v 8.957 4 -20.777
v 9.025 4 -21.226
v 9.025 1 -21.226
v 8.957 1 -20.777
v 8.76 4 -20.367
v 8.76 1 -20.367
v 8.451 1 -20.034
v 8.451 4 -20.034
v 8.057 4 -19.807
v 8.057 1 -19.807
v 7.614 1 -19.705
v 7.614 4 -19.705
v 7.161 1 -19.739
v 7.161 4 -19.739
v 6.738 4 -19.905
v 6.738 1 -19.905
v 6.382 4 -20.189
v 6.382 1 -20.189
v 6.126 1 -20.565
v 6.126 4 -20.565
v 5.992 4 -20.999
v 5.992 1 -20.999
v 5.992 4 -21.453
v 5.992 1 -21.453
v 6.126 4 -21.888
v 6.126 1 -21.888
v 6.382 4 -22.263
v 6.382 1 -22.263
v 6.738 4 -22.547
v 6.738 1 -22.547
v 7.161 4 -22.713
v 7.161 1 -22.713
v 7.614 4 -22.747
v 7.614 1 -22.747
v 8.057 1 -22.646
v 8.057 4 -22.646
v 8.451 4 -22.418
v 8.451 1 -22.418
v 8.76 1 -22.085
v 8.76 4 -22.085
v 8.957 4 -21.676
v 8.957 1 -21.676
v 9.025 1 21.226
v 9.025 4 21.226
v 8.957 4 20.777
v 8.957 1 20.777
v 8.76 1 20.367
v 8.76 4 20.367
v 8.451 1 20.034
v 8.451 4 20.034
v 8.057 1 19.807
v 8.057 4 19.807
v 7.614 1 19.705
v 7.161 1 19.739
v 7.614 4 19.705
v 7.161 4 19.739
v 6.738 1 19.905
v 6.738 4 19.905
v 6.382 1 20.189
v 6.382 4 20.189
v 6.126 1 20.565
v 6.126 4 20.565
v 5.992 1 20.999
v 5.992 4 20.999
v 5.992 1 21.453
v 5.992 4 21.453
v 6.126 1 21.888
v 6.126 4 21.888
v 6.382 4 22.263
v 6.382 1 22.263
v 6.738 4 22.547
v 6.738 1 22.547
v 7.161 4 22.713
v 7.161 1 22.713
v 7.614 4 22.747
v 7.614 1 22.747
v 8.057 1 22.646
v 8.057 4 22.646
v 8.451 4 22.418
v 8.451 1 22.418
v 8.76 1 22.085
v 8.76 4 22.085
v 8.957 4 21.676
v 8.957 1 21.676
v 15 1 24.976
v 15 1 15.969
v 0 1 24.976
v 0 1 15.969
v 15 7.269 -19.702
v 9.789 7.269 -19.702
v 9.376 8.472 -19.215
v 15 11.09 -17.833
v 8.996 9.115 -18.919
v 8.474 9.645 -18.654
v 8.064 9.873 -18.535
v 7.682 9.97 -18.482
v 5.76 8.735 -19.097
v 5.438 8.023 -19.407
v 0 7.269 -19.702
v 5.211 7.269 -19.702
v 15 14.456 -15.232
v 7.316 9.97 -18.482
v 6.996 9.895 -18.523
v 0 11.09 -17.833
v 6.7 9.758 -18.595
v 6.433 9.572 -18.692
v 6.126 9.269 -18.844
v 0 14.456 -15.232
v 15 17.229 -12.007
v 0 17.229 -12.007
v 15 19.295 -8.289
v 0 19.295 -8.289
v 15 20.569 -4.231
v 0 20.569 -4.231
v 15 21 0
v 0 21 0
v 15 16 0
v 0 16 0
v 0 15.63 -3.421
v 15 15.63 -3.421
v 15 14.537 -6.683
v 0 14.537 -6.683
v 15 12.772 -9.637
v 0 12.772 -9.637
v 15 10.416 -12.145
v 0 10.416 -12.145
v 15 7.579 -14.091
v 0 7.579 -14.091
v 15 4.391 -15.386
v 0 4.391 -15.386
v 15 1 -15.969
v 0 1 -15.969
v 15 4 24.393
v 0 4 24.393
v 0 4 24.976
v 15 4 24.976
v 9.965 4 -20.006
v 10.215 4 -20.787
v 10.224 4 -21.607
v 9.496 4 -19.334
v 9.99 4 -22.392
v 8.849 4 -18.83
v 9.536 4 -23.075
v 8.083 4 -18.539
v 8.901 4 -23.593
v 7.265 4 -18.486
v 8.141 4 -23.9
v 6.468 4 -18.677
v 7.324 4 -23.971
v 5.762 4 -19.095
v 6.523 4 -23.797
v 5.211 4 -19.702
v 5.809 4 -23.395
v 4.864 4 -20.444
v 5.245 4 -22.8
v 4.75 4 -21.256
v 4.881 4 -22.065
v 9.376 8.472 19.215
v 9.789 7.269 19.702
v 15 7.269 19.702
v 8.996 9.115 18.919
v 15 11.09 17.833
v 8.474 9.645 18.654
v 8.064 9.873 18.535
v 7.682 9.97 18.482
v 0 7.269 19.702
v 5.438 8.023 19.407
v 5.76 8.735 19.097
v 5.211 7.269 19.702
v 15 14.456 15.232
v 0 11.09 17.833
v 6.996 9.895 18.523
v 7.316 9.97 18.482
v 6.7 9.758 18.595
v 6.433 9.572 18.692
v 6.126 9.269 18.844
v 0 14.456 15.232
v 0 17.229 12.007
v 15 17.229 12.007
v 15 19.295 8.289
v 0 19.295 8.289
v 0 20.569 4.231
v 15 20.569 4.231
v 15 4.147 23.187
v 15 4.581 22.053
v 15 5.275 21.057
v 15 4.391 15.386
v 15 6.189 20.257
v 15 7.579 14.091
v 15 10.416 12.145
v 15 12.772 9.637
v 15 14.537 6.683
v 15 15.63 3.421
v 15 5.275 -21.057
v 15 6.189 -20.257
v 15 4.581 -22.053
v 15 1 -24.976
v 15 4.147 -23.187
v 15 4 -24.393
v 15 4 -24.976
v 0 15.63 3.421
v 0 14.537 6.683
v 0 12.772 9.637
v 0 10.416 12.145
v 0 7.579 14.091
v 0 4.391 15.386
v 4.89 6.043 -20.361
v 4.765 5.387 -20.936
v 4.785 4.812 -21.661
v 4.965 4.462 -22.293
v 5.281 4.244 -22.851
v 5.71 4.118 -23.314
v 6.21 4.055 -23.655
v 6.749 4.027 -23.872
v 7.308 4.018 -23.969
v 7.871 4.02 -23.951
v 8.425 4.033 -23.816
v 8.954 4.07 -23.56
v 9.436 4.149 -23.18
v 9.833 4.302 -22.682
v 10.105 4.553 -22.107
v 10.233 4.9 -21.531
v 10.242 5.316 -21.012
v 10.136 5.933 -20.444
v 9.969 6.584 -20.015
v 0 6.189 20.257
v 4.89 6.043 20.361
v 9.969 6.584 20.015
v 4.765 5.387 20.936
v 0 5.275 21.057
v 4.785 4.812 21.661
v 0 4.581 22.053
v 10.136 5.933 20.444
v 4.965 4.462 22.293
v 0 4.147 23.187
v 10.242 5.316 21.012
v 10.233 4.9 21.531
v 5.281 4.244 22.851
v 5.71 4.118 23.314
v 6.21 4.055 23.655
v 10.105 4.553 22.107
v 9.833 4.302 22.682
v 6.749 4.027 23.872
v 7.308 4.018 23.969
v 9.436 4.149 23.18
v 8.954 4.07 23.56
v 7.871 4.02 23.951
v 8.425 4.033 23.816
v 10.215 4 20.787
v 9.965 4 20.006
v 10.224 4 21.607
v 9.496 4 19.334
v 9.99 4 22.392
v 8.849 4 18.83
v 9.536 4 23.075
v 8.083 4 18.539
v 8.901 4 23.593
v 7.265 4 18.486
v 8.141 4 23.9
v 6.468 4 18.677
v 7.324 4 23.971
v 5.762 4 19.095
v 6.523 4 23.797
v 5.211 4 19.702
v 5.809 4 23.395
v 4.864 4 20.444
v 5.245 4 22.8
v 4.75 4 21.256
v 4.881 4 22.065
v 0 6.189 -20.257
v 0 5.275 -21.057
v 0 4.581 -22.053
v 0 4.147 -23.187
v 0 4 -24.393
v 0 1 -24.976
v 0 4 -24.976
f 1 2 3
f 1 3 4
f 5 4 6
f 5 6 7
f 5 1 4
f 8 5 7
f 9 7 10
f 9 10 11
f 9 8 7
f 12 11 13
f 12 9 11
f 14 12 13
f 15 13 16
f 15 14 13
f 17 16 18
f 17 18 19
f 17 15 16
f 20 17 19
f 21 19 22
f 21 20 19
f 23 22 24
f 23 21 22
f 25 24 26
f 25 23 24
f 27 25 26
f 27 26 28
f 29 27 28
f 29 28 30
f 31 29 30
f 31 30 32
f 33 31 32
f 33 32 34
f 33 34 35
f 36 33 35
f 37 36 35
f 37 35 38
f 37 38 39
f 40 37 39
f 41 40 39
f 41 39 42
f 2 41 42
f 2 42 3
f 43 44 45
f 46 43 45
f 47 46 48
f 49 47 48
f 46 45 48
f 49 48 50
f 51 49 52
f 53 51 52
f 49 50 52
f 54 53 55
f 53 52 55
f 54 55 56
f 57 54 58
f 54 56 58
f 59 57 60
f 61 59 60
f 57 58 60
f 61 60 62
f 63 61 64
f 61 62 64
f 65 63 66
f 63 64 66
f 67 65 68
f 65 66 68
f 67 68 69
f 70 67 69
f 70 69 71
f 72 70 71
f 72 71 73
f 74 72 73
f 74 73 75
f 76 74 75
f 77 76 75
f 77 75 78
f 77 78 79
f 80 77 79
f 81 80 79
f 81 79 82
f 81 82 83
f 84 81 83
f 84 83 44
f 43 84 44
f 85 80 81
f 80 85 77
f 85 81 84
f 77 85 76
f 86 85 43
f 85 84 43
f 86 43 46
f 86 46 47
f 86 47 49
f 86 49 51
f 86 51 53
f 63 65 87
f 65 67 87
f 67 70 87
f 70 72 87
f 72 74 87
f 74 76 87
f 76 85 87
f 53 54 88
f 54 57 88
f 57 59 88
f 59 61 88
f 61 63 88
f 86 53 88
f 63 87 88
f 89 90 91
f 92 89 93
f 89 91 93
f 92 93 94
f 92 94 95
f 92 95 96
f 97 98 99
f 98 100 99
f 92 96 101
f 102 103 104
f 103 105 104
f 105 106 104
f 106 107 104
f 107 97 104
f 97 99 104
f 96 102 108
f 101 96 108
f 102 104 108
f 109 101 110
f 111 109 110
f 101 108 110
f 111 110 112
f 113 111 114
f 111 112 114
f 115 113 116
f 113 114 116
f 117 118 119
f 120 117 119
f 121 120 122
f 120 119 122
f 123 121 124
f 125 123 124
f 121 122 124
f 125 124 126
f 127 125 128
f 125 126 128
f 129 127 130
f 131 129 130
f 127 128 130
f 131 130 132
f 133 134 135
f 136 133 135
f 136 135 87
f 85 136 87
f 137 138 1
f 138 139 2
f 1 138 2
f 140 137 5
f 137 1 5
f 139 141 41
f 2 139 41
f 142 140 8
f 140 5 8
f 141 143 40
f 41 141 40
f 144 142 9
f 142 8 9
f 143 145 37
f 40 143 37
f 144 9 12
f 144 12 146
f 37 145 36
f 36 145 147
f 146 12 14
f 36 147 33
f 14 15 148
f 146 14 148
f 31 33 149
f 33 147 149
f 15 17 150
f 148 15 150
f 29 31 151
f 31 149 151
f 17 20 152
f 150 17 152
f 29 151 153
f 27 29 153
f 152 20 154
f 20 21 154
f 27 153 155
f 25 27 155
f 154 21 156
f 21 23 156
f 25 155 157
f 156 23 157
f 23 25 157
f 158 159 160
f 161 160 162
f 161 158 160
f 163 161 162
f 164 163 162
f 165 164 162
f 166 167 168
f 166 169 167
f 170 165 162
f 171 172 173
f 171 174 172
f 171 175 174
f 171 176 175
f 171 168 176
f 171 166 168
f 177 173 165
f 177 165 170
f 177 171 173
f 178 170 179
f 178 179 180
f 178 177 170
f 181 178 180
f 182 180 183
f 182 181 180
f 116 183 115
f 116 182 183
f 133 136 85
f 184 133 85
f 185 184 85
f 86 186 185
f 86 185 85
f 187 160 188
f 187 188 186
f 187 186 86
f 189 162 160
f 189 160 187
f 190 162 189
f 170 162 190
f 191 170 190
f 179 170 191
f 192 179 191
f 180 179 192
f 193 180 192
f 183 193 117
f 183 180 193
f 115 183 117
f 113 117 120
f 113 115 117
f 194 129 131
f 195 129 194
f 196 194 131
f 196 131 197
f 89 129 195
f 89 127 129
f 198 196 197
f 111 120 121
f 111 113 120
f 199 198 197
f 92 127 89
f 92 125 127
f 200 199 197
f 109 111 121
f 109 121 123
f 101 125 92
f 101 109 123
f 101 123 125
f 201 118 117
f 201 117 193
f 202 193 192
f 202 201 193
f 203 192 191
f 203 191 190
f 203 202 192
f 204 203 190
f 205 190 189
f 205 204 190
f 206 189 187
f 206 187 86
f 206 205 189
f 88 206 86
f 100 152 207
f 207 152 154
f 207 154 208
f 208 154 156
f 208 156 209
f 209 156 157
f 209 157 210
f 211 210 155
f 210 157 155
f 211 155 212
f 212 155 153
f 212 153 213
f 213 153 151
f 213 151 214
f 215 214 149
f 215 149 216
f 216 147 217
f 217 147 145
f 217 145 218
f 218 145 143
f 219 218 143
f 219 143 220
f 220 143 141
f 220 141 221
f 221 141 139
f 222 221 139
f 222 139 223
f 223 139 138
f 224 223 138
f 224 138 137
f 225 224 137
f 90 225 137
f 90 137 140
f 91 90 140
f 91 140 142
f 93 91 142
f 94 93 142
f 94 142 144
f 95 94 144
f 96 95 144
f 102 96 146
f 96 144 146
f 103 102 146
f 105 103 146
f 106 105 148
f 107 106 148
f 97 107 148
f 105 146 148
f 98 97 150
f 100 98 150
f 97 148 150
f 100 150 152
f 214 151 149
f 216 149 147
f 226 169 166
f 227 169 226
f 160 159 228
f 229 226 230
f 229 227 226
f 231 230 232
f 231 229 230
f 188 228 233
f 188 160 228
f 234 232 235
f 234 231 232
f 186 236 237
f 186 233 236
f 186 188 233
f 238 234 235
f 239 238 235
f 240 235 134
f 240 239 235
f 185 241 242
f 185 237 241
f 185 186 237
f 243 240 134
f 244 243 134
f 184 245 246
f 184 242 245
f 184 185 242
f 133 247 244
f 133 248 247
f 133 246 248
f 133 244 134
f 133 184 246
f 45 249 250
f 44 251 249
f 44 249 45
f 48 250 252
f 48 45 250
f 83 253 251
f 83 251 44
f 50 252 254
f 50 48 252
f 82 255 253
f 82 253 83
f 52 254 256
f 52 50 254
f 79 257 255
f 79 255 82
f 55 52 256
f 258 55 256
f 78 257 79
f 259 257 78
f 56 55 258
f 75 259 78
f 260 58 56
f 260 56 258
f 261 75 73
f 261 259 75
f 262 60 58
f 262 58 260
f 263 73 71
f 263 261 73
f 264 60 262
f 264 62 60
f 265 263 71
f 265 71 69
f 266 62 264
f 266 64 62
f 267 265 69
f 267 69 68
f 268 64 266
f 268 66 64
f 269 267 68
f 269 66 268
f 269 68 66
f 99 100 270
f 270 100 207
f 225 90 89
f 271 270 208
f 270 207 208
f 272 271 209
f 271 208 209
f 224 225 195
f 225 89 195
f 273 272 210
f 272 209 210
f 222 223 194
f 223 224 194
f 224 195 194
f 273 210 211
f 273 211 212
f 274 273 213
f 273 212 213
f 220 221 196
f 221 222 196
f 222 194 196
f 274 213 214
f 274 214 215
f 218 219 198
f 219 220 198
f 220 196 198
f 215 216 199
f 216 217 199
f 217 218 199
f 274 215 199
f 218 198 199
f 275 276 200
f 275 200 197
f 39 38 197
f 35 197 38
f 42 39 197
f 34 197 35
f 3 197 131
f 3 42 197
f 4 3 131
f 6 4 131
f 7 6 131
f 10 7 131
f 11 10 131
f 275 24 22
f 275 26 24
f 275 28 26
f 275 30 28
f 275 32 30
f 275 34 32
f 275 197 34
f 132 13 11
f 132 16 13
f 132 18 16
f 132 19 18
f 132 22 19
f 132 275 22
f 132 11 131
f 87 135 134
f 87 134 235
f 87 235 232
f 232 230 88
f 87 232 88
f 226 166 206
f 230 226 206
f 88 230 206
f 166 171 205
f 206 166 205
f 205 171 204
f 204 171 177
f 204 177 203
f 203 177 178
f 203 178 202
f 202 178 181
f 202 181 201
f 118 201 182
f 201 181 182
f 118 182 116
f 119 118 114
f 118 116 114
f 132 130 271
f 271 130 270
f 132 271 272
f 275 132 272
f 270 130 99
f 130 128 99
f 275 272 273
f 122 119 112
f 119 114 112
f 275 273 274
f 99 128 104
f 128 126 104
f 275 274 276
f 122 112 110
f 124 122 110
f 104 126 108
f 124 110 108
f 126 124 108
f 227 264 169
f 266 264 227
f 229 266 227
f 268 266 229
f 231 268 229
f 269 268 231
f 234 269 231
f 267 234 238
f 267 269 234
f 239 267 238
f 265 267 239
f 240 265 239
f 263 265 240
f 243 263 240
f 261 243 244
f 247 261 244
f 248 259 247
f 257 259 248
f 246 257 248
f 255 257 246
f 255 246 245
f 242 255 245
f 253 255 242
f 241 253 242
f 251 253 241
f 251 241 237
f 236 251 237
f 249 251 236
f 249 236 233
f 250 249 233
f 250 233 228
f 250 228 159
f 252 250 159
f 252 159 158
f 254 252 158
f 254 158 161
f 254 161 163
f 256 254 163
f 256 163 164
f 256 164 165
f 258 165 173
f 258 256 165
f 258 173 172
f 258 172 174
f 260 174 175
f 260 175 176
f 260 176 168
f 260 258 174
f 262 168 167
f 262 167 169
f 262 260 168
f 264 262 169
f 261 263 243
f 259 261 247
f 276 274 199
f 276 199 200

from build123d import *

# Parameters (mm, degrees)
BOSS_EXTRUDE1_DEPTH = 15
FILLET1_R           = 5
SKETCH2_R           = 2.75
CUT_EXTRUDE1_DEPTH  = 34.73143068
CUT_EXTRUDE2_DEPTH  = 34.731430775


# Read off the part's stored shape, not the designer's step: Mirror1
with BuildPart() as part:
    # Sketch1 → Boss-Extrude1 (new body)
    with BuildSketch(Plane(origin=(0, 0, 0), x_dir=(0, 0, -1), z_dir=(1, 0, 0))):
        with BuildLine():
            ThreePointArc((-20.976176963, 1), (-14.491376746, 15.198684154), (0, 21))
            Line((0, 21), (0, 16))
            ThreePointArc((0, 16), (-10.95445115, 11.66190379), (-15.968719423, 1))
            Line((-15.968719423, 1), (-20.976176963, 1))
        make_face()
        with BuildLine():
            Line((-24.976176963, 1), (-20.976176963, 1))
            ThreePointArc((-20.976176963, 1), (-20.84987969, 2.506494942), (-20.615528128, 4))
            Line((-20.615528128, 4), (-24.976176963, 4))
            Line((-24.976176963, 4), (-24.976176963, 1))
        make_face()
    extrude(amount=BOSS_EXTRUDE1_DEPTH)

    # Fillet1
    fillet1_edges = [part.edges().sort_by_distance(p)[0] for p in [
        (7.5, 4, 20.615528128),
    ]]
    fillet(fillet1_edges, radius=FILLET1_R)

    # Sketch2 → Cut-Extrude1 (cut, through all)
    with BuildSketch(Plane(origin=(0, 4, 0), x_dir=(1, 0, 0), z_dir=(0, 1, 0))):
        with Locations(Location((7.5, -21.226176963, 0), (0, 0, 146.334508492))):
            Circle(SKETCH2_R)
    extrude(amount=CUT_EXTRUDE1_DEPTH, mode=Mode.SUBTRACT)

    # Sketch2<3> → Cut-Extrude2 (cut, through all)
    with BuildSketch(Plane(origin=(0, 4, 0), x_dir=(1, 0, 0), z_dir=(0, 1, 0))):
        with BuildLine():
            ThreePointArc((5.975, -21.226176963), (7.5, -22.751176963), (9.025, -21.226176963))
            Line((9.025, -21.226176963), (5.975, -21.226176963))
        make_face()
        with BuildLine():
            Line((5.975, -21.226176963), (9.025, -21.226176963))
            ThreePointArc((9.025, -21.226176963), (7.5, -19.701176963), (5.975, -21.226176963))
        make_face()
    extrude(amount=-CUT_EXTRUDE2_DEPTH, mode=Mode.SUBTRACT)

    # Mirror1: part across plane


with BuildPart() as part_1:
    add(part.part)
    add(part.part.mirror(Plane.XY))


solid = part_1.part
